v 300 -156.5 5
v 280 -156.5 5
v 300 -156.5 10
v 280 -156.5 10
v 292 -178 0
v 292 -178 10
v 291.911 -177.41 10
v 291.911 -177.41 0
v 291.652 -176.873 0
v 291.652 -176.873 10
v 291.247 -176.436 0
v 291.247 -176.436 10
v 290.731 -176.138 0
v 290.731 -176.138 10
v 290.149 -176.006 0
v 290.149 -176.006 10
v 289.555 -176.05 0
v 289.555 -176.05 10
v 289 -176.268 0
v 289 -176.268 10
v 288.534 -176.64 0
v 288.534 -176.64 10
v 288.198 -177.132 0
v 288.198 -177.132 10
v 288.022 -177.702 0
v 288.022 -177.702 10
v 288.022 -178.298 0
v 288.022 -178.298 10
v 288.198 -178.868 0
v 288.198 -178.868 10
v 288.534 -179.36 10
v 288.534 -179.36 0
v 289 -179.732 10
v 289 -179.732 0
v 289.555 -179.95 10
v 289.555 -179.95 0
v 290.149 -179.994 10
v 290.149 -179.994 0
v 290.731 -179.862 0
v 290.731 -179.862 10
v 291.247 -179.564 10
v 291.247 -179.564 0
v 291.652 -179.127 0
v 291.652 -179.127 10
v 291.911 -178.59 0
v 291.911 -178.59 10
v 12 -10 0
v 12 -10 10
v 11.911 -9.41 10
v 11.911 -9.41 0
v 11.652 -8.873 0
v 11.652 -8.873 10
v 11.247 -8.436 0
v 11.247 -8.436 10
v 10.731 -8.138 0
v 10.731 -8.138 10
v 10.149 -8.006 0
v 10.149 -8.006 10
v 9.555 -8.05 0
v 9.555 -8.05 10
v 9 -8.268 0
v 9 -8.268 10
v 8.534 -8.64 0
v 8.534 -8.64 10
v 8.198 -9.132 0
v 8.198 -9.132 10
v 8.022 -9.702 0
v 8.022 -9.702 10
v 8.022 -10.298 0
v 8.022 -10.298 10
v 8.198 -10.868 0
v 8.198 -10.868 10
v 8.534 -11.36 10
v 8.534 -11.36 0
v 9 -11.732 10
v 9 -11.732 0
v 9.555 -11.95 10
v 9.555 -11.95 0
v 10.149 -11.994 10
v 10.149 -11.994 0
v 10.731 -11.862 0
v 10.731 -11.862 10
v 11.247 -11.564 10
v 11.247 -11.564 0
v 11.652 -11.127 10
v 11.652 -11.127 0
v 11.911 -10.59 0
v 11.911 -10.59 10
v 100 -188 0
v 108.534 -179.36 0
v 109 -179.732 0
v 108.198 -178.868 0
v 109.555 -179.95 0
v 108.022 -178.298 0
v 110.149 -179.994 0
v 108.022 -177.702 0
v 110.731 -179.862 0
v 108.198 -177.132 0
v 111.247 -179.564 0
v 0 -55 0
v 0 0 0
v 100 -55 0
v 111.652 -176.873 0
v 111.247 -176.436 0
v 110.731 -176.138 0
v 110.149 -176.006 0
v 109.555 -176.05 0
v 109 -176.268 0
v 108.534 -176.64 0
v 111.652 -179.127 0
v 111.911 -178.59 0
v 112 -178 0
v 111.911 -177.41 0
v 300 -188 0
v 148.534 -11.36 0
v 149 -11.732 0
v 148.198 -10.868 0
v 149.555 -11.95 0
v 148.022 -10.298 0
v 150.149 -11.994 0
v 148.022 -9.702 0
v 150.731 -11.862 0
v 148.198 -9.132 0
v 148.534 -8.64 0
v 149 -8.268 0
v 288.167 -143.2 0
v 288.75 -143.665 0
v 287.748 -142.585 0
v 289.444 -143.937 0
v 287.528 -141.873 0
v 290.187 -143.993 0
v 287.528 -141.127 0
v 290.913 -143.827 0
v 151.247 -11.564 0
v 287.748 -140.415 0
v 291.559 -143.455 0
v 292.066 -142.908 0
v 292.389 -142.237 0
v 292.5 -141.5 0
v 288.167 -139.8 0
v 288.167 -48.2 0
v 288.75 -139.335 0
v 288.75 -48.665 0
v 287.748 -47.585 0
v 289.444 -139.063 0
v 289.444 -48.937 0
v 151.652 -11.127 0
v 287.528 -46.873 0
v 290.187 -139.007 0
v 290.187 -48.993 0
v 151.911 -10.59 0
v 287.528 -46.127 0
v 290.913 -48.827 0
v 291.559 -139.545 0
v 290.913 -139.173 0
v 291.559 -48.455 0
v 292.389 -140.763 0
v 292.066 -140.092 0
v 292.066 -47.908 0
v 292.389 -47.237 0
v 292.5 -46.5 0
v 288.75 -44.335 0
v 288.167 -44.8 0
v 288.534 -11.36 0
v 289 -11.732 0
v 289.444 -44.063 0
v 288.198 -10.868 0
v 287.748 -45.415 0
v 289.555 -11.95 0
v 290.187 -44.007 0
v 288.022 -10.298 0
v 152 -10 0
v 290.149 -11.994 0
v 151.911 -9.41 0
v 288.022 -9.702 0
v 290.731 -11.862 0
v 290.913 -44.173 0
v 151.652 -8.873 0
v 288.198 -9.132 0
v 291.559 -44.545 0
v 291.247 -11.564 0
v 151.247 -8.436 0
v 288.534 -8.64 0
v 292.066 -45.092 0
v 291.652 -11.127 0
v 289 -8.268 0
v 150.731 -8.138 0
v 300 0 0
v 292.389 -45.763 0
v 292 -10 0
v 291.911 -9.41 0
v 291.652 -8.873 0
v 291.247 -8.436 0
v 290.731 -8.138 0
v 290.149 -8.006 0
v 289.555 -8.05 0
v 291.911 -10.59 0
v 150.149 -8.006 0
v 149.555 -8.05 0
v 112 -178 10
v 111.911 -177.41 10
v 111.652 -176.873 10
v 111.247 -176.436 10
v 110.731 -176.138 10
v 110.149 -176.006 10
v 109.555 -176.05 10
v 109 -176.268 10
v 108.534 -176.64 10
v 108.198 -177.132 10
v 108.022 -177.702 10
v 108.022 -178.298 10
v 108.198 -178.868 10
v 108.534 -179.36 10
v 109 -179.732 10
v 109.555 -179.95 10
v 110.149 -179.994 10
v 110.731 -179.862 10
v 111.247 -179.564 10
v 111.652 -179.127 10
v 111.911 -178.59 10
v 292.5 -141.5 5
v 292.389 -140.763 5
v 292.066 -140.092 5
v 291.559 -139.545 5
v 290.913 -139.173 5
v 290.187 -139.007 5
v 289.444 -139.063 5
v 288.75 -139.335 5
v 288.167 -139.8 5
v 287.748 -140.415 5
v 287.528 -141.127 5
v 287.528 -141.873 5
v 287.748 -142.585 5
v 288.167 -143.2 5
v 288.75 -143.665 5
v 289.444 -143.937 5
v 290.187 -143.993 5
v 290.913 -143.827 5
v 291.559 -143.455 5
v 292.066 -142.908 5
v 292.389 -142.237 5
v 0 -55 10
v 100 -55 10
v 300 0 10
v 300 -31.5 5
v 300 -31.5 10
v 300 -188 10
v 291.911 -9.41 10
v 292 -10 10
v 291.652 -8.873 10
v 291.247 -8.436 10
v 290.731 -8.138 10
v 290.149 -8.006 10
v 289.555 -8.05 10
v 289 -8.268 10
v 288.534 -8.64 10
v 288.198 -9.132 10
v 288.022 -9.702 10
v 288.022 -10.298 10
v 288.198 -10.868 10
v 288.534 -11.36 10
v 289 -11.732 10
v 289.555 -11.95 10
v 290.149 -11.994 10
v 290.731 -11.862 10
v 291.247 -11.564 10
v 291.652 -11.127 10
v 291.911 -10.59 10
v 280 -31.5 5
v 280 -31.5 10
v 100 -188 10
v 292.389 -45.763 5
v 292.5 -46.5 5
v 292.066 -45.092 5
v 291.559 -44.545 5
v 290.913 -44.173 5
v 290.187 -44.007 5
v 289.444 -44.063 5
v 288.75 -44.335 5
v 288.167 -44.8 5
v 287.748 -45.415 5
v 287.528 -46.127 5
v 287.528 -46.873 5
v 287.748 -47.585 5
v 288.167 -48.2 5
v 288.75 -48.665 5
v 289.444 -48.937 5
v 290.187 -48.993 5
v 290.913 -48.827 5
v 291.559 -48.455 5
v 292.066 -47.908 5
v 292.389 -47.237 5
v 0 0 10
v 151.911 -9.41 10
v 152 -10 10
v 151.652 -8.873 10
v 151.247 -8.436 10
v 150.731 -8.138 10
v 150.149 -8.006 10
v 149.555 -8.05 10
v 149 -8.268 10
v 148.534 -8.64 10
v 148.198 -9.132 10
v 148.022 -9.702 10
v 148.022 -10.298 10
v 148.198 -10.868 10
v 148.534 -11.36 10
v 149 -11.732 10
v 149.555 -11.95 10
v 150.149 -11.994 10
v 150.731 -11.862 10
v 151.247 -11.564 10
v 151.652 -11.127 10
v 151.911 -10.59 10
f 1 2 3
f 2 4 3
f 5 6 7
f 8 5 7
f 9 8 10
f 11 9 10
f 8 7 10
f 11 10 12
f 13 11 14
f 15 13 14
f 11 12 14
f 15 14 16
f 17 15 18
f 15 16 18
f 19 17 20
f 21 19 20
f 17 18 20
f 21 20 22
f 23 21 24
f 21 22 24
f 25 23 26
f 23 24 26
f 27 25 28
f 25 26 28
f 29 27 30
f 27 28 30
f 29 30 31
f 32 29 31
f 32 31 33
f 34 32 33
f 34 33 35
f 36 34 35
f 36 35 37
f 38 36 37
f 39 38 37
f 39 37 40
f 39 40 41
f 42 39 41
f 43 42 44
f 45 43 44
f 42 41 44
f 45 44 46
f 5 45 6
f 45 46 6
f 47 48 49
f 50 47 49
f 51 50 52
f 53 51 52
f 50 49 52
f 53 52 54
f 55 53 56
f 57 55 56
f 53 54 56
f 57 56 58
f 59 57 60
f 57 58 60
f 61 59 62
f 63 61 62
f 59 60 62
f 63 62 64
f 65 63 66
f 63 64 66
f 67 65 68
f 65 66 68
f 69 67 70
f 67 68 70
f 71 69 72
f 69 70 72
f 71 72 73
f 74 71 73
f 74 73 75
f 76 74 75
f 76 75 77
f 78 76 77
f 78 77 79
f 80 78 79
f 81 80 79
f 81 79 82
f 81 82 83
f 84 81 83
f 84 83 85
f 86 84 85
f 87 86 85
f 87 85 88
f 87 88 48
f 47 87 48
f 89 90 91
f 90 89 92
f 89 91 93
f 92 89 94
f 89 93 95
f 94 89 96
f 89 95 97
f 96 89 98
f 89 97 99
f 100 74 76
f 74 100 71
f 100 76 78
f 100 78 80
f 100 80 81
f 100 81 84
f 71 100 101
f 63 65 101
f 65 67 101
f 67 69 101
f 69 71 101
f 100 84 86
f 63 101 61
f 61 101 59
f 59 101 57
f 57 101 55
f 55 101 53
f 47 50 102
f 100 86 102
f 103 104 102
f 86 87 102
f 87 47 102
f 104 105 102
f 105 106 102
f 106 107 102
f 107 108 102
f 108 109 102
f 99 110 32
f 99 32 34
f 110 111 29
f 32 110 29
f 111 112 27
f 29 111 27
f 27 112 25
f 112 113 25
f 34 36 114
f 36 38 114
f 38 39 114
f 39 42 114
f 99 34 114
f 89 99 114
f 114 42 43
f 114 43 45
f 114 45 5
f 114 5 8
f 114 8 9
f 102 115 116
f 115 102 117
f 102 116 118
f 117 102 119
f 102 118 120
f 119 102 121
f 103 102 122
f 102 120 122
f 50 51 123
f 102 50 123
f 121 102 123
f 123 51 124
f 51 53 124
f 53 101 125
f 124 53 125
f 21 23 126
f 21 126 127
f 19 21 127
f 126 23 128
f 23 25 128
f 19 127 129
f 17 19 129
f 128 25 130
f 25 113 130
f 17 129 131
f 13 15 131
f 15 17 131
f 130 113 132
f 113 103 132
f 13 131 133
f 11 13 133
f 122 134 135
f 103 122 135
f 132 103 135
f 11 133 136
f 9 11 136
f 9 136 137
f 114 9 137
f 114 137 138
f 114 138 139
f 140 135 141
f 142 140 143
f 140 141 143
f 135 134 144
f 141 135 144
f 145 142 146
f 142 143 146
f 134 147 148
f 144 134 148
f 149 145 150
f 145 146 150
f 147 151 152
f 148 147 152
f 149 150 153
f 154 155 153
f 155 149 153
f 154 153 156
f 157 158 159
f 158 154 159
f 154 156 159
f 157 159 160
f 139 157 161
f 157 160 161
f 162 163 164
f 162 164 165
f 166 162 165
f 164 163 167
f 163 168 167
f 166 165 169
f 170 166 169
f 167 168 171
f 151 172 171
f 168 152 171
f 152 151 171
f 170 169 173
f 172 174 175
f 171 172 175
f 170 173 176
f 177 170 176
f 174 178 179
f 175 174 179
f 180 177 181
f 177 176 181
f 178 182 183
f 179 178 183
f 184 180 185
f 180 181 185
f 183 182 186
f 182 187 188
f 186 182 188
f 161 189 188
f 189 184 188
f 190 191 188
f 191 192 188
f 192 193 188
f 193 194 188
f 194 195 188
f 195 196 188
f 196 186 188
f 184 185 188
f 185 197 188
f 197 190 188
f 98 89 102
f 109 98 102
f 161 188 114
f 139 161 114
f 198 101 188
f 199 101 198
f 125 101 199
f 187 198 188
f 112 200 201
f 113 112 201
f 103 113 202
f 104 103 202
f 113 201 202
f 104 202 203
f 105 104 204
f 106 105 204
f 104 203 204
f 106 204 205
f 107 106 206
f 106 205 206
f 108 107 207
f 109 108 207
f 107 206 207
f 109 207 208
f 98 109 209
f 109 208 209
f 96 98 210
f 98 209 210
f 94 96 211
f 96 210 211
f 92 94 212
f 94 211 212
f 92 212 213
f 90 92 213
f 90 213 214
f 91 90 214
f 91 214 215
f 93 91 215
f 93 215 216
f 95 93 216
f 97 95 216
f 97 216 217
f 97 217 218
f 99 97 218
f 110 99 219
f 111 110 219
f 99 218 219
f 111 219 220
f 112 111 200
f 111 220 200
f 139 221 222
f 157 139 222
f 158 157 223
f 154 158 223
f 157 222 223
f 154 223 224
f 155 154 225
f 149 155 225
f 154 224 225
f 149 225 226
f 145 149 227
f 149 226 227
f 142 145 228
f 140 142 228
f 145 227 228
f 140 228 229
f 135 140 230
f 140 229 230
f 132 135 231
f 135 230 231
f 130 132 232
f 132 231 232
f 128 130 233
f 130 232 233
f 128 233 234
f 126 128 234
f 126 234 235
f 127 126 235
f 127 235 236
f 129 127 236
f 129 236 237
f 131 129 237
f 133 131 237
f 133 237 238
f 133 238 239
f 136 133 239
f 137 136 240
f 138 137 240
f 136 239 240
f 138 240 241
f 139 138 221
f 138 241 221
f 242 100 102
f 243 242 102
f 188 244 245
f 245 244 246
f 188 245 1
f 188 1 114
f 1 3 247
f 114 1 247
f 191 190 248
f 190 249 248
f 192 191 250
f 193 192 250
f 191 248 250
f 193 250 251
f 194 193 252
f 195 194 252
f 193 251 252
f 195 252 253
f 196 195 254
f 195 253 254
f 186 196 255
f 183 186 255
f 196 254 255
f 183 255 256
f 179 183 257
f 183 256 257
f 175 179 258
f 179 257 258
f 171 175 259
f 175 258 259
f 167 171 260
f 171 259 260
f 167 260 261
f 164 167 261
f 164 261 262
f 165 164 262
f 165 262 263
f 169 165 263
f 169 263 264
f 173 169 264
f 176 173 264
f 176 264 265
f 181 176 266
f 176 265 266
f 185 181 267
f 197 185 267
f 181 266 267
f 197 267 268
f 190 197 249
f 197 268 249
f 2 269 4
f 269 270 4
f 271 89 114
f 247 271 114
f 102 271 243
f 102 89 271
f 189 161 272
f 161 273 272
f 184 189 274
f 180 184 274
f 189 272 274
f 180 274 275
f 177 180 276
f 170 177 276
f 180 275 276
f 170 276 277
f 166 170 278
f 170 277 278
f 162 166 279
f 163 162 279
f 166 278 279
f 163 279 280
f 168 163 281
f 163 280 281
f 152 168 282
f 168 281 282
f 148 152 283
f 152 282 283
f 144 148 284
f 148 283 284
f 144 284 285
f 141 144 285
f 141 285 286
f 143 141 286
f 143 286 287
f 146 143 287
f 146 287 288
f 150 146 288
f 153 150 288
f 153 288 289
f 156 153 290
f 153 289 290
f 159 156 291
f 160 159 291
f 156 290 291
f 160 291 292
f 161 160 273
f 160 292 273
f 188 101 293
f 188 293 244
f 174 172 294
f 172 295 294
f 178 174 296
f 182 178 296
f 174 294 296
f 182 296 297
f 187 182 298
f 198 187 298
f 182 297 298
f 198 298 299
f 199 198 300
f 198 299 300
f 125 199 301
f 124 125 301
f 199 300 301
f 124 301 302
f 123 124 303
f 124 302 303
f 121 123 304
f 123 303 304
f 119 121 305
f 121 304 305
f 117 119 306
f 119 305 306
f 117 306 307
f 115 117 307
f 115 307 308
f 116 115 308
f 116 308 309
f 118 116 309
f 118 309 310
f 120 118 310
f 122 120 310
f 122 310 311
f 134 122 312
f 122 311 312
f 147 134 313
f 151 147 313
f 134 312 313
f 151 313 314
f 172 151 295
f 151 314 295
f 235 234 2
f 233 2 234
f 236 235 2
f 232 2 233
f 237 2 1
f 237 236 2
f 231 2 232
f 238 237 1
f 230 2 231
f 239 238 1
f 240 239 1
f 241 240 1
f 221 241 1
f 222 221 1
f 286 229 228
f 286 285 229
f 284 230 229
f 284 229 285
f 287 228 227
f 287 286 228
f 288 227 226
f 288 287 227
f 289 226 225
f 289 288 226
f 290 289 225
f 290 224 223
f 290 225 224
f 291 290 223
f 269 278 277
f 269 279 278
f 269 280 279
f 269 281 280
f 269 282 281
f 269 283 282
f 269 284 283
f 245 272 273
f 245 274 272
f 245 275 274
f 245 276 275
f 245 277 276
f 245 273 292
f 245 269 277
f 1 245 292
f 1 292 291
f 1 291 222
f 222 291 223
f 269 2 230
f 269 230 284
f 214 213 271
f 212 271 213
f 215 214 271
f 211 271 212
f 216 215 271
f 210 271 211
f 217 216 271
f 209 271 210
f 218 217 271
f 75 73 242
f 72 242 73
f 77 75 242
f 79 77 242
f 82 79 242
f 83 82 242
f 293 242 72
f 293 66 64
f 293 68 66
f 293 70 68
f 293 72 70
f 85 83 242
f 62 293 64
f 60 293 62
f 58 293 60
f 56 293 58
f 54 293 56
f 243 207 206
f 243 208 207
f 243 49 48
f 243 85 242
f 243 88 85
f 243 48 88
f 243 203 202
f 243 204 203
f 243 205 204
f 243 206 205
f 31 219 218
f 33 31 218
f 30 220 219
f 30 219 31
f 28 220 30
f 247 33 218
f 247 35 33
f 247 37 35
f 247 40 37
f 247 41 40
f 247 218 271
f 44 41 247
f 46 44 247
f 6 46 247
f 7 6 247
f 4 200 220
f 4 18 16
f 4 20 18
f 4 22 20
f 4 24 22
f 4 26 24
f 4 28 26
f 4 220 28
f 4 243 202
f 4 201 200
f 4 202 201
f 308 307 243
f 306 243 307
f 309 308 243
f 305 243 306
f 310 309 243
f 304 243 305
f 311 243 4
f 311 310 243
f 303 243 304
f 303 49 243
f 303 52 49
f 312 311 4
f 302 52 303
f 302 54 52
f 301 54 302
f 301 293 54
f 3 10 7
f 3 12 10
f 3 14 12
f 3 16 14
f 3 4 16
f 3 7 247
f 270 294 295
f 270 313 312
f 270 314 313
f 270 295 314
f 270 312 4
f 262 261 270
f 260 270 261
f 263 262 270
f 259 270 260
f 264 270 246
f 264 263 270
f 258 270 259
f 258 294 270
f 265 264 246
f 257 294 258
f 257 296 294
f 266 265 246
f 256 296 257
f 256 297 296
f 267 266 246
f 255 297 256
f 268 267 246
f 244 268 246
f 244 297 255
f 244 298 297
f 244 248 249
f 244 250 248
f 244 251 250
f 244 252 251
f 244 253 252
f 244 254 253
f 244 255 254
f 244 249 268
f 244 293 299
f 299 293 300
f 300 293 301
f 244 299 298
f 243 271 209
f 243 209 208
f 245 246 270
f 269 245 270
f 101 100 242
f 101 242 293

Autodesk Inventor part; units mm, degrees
ref_plane "YZ Plane" through (0, 0, 0) normal (1, 0, 0) x (0, 1, 0)
ref_plane "XZ Plane" through (0, 0, 0) normal (0, 1, 0) x (-1, 0, 0)
ref_plane "XY Plane" through (0, 0, 0) normal (0, 0, 1) x (1, 0, 0)
sketch "Sketch1" plane through (0, 0, 0) normal (0, 0, 1) x (1, 0, 0)
  line L0 (0, 0) -> (600, 0)
  line L1 (100, -188) -> (500, -188)
  line L2 (500, -188) -> (500, -55)
  line L3 (500, -55) -> (600, -55)
  line L4 (600, -55) -> (600, 0)
  line L5 (100, -188) -> (100, -55)
  line L6 (0, -55) -> (0, 0)
  line L7 (0, -55) -> (100, -55)
  point P0 (300, -188)
  point P1 (300, 0)
  dimension "d0" = 600
  dimension "d1" = 188
  dimension "d2" = 400
  dimension "d3" = 133
extrude "Extrusion1" add sketch "Sketch1" along normal blind 10
sketch "Sketch2" plane through (0, 0, 10) normal (0, 0, 1) x (1, 0, 0)
  line L0 (600, 0) -> (0, 0) projected
  line L1 (500, -188) -> (100, -188) projected
  line L2 (600, 0) -> (300, 0)
  line L3 (300, 0) -> (300, -188)
  line L4 (300, -188) -> (600, -188)
  line L5 (600, -188) -> (600, 0)
extrude "Extrusion2" cut sketch "Sketch2" against normal through all
sketch "Sketch3" plane through (0, 0, 10) normal (0, 0, 1) x (1, 0, 0)
  circle A0 centre (10, -10) radius 2
  line L0 (300, 0) -> (0, 0) projected
  line L1 (0, 0) -> (0, -55) projected
  circle A1 centre (150, -10) radius 2
  circle A2 centre (290, -10) radius 2
  line L2 (300, -188) -> (300, 0) projected
  line L3 (10, -10) -> (290, -10) construction
  circle A3 centre (110, -178) radius 2
  line L4 (100, -55) -> (100, -188) projected
  line L5 (100, -188) -> (300, -188) projected
  circle A4 centre (290, -178) radius 2
  dimension "d8" = 4
  dimension "d9" = 10
  dimension "d10" = 10
  dimension "d11" = 4
  dimension "d12" = 4
  dimension "d13" = 10
  dimension "d14" = 4
  dimension "d15" = 10
  dimension "d16" = 10
  dimension "d17" = 4
  dimension "d18" = 10
  dimension "d19" = 10
extrude "Extrusion3" cut sketch "Sketch3" against normal through all
sketch "Sketch6" plane through (0, 0, 10) normal (0, 0, 1) x (1, 0, 0)
  line L0 (300, -31.5) -> (280, -31.5)
  line L1 (280, -31.5) -> (280, -156.5)
  line L2 (280, -156.5) -> (300, -156.5)
  line L3 (300, -156.5) -> (300, -31.5)
  line L4 (300, -188) -> (300, 0) projected
  point P0 (0, 0)
  point P1 (300, -94)
  dimension "d42" = 20
  dimension "d43" = 125
extrude "Extrusion6" cut sketch "Sketch6" against normal blind 5
sketch "Sketch7" plane through (0, 0, 5) normal (0, 0, 1) x (1, 0, 0)
  line L0 (290, -46.5) -> (290, -141.5) construction
  circle A0 centre (290, -46.5) radius 2.5
  circle A1 centre (290, -141.5) radius 2.5
  line L1 (300, -31.5) -> (300, -156.5) projected
  point P0 (0, 0)
  point P1 (290, -94)
  point P2 (300, -94)
  dimension "d46" = 5
  dimension "d47" = 5
  dimension "d48" = 10
  dimension "d49" = 95
extrude "Extrusion7" cut sketch "Sketch7" against normal through all
properties part number "SP001b" material "ABS Plastic"
